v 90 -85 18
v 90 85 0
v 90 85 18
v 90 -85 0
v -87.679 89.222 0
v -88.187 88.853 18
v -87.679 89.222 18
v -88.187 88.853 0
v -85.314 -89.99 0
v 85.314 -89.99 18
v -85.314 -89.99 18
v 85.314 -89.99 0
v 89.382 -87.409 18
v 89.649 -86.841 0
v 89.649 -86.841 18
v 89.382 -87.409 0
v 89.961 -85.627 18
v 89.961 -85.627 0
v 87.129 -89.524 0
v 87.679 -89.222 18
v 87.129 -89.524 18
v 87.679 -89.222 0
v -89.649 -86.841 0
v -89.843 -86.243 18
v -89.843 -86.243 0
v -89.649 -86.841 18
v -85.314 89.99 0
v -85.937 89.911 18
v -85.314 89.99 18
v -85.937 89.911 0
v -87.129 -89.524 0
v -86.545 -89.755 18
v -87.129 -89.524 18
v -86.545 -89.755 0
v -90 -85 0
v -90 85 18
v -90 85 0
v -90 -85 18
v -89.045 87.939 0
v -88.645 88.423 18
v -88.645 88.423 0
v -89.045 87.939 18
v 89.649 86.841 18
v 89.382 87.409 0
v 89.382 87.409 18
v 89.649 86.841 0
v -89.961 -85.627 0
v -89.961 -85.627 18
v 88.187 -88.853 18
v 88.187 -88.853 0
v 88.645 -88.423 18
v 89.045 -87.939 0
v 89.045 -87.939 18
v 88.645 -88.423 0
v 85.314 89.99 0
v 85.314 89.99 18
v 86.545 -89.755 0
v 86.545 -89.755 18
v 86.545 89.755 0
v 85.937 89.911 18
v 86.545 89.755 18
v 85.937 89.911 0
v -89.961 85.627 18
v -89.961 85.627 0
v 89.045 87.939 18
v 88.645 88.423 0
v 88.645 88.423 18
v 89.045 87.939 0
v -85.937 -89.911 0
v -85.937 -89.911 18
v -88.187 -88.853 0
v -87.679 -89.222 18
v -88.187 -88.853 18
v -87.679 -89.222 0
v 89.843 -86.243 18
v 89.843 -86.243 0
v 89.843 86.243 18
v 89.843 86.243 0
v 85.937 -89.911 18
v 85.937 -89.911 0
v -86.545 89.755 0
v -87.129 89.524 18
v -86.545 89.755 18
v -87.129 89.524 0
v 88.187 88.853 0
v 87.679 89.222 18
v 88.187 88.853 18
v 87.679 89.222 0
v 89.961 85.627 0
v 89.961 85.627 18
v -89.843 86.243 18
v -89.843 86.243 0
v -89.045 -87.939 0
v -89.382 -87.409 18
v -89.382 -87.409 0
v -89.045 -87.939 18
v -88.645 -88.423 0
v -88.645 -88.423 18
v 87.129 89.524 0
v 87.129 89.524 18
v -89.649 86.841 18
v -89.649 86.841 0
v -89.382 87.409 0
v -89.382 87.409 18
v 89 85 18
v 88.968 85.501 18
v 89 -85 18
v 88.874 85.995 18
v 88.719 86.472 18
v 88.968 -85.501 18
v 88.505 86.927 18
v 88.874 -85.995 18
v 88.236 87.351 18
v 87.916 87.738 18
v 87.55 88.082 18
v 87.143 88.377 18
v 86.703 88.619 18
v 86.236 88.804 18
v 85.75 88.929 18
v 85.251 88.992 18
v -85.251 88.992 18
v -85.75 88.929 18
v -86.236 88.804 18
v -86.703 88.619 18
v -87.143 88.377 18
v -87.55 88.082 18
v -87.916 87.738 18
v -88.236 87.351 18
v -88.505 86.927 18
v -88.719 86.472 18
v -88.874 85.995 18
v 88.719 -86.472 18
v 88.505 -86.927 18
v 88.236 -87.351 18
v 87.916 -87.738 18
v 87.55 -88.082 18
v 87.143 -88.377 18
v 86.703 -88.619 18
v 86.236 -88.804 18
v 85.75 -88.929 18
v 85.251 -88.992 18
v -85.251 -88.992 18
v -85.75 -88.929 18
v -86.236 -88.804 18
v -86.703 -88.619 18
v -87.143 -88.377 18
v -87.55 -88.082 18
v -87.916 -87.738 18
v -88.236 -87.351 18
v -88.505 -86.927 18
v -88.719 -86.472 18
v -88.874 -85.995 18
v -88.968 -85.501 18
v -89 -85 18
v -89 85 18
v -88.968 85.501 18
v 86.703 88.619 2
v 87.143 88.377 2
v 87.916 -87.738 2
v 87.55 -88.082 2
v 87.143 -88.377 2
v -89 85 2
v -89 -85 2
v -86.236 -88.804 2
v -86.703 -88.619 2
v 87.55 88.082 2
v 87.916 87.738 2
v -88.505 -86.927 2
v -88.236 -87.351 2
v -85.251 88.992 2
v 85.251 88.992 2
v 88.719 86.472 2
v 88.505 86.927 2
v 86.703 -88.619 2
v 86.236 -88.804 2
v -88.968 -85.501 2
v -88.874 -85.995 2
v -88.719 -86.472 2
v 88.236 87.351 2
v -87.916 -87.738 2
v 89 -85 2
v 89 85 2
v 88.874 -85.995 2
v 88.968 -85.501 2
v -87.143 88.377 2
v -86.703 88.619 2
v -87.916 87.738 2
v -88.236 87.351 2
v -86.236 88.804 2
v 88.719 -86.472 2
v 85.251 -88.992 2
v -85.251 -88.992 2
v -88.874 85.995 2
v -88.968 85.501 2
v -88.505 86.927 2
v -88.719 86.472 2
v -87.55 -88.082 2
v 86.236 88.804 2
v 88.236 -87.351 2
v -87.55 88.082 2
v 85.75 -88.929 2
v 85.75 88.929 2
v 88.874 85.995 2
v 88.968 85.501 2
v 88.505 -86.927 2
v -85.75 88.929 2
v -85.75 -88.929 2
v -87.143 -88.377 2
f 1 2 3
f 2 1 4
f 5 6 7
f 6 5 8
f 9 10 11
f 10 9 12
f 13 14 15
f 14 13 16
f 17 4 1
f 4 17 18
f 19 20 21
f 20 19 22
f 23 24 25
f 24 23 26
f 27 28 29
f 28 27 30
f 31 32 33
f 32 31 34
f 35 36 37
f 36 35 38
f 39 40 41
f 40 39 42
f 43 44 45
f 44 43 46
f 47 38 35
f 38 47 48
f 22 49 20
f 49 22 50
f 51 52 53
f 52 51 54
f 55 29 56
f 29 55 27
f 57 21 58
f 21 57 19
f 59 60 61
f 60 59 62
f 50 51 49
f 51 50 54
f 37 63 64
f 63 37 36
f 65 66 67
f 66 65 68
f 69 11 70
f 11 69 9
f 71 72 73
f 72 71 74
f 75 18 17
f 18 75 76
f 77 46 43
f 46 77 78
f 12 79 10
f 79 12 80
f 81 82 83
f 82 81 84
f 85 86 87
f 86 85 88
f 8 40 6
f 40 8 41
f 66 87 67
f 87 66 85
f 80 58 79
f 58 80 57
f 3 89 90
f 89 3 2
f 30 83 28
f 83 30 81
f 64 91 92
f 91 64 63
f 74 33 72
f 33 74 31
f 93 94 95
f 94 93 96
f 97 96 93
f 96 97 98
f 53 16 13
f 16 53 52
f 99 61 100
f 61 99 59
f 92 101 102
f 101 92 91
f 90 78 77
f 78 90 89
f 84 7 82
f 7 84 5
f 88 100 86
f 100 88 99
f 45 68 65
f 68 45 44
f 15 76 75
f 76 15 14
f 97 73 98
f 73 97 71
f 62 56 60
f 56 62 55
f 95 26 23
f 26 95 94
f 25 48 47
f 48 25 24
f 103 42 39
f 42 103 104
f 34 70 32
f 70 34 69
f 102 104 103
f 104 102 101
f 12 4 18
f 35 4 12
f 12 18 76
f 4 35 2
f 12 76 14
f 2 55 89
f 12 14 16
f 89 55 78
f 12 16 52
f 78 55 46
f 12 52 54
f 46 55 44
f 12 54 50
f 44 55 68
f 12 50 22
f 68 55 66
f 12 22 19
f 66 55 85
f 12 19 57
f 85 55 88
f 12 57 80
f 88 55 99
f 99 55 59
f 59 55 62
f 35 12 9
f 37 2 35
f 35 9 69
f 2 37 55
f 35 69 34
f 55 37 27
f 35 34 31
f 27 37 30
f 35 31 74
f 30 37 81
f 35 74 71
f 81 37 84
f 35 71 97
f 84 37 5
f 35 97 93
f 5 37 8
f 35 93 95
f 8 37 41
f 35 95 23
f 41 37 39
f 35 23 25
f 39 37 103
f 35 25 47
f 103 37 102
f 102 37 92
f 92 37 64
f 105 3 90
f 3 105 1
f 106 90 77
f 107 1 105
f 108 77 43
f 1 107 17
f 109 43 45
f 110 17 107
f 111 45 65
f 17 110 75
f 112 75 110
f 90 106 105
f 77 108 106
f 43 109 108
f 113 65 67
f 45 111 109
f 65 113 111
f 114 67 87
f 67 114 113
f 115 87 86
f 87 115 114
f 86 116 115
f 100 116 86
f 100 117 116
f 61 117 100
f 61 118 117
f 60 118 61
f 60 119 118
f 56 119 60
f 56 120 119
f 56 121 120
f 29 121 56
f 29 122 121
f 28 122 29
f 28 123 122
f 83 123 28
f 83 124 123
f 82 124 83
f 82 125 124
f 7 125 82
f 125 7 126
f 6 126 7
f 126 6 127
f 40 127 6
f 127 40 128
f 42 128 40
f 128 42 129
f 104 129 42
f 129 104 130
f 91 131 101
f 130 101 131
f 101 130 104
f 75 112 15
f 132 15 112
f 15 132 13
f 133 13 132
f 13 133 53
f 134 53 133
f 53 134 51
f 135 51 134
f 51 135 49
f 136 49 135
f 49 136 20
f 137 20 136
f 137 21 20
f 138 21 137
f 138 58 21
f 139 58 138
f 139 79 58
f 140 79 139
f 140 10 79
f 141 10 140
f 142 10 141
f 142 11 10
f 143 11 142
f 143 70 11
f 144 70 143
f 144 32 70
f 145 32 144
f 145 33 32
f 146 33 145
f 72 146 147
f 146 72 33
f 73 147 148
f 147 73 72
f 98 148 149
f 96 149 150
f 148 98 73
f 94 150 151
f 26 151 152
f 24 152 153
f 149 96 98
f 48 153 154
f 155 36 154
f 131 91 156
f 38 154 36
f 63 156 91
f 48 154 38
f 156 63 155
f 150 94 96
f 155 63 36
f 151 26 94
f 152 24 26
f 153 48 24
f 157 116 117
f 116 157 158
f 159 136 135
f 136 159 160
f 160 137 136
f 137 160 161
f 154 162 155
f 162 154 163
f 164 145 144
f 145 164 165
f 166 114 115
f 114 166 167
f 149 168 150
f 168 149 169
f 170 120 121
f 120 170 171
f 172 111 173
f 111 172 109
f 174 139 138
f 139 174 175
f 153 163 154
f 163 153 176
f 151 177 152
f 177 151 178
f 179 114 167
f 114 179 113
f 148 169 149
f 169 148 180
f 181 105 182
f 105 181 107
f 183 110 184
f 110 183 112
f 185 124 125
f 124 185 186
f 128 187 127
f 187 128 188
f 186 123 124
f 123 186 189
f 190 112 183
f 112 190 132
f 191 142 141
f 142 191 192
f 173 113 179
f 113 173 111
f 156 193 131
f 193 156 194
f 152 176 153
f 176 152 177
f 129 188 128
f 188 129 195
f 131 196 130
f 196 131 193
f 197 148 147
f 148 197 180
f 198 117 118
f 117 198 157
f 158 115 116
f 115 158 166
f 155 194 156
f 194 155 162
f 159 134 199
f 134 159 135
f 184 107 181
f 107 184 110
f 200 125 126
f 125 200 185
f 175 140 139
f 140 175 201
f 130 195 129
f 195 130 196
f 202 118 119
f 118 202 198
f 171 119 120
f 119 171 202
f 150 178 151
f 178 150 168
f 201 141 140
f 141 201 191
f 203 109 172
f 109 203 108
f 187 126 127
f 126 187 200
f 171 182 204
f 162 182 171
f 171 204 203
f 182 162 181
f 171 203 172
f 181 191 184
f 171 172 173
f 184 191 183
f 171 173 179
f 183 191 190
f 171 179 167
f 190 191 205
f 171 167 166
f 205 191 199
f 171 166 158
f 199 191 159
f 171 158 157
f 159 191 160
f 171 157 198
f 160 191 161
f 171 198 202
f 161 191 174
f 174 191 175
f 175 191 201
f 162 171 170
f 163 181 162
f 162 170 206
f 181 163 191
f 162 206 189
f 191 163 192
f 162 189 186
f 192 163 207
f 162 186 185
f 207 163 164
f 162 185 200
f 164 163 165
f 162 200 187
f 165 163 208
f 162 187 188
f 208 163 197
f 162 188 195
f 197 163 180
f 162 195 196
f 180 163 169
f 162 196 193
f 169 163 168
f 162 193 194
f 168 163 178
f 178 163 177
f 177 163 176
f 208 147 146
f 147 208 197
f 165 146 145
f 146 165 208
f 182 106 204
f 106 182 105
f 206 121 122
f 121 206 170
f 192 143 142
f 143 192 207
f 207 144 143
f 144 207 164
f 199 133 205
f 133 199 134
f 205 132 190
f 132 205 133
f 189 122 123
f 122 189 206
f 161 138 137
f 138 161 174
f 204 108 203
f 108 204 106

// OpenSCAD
$fn = 50;


difference() {
	union() {
		hull() {
			translate(v = [-85.0000000000, 85.0000000000, 0]) {
				cylinder(h = 18, r = 5);
			}
			translate(v = [85.0000000000, 85.0000000000, 0]) {
				cylinder(h = 18, r = 5);
			}
			translate(v = [-85.0000000000, -85.0000000000, 0]) {
				cylinder(h = 18, r = 5);
			}
			translate(v = [85.0000000000, -85.0000000000, 0]) {
				cylinder(h = 18, r = 5);
			}
		}
	}
	union() {
		translate(v = [0, 0, 2]) {
			hull() {
				translate(v = [-85.0000000000, 85.0000000000, 0]) {
					cylinder(h = 16, r = 4);
				}
				translate(v = [85.0000000000, 85.0000000000, 0]) {
					cylinder(h = 16, r = 4);
				}
				translate(v = [-85.0000000000, -85.0000000000, 0]) {
					cylinder(h = 16, r = 4);
				}
				translate(v = [85.0000000000, -85.0000000000, 0]) {
					cylinder(h = 16, r = 4);
				}
			}
		}
	}
}
